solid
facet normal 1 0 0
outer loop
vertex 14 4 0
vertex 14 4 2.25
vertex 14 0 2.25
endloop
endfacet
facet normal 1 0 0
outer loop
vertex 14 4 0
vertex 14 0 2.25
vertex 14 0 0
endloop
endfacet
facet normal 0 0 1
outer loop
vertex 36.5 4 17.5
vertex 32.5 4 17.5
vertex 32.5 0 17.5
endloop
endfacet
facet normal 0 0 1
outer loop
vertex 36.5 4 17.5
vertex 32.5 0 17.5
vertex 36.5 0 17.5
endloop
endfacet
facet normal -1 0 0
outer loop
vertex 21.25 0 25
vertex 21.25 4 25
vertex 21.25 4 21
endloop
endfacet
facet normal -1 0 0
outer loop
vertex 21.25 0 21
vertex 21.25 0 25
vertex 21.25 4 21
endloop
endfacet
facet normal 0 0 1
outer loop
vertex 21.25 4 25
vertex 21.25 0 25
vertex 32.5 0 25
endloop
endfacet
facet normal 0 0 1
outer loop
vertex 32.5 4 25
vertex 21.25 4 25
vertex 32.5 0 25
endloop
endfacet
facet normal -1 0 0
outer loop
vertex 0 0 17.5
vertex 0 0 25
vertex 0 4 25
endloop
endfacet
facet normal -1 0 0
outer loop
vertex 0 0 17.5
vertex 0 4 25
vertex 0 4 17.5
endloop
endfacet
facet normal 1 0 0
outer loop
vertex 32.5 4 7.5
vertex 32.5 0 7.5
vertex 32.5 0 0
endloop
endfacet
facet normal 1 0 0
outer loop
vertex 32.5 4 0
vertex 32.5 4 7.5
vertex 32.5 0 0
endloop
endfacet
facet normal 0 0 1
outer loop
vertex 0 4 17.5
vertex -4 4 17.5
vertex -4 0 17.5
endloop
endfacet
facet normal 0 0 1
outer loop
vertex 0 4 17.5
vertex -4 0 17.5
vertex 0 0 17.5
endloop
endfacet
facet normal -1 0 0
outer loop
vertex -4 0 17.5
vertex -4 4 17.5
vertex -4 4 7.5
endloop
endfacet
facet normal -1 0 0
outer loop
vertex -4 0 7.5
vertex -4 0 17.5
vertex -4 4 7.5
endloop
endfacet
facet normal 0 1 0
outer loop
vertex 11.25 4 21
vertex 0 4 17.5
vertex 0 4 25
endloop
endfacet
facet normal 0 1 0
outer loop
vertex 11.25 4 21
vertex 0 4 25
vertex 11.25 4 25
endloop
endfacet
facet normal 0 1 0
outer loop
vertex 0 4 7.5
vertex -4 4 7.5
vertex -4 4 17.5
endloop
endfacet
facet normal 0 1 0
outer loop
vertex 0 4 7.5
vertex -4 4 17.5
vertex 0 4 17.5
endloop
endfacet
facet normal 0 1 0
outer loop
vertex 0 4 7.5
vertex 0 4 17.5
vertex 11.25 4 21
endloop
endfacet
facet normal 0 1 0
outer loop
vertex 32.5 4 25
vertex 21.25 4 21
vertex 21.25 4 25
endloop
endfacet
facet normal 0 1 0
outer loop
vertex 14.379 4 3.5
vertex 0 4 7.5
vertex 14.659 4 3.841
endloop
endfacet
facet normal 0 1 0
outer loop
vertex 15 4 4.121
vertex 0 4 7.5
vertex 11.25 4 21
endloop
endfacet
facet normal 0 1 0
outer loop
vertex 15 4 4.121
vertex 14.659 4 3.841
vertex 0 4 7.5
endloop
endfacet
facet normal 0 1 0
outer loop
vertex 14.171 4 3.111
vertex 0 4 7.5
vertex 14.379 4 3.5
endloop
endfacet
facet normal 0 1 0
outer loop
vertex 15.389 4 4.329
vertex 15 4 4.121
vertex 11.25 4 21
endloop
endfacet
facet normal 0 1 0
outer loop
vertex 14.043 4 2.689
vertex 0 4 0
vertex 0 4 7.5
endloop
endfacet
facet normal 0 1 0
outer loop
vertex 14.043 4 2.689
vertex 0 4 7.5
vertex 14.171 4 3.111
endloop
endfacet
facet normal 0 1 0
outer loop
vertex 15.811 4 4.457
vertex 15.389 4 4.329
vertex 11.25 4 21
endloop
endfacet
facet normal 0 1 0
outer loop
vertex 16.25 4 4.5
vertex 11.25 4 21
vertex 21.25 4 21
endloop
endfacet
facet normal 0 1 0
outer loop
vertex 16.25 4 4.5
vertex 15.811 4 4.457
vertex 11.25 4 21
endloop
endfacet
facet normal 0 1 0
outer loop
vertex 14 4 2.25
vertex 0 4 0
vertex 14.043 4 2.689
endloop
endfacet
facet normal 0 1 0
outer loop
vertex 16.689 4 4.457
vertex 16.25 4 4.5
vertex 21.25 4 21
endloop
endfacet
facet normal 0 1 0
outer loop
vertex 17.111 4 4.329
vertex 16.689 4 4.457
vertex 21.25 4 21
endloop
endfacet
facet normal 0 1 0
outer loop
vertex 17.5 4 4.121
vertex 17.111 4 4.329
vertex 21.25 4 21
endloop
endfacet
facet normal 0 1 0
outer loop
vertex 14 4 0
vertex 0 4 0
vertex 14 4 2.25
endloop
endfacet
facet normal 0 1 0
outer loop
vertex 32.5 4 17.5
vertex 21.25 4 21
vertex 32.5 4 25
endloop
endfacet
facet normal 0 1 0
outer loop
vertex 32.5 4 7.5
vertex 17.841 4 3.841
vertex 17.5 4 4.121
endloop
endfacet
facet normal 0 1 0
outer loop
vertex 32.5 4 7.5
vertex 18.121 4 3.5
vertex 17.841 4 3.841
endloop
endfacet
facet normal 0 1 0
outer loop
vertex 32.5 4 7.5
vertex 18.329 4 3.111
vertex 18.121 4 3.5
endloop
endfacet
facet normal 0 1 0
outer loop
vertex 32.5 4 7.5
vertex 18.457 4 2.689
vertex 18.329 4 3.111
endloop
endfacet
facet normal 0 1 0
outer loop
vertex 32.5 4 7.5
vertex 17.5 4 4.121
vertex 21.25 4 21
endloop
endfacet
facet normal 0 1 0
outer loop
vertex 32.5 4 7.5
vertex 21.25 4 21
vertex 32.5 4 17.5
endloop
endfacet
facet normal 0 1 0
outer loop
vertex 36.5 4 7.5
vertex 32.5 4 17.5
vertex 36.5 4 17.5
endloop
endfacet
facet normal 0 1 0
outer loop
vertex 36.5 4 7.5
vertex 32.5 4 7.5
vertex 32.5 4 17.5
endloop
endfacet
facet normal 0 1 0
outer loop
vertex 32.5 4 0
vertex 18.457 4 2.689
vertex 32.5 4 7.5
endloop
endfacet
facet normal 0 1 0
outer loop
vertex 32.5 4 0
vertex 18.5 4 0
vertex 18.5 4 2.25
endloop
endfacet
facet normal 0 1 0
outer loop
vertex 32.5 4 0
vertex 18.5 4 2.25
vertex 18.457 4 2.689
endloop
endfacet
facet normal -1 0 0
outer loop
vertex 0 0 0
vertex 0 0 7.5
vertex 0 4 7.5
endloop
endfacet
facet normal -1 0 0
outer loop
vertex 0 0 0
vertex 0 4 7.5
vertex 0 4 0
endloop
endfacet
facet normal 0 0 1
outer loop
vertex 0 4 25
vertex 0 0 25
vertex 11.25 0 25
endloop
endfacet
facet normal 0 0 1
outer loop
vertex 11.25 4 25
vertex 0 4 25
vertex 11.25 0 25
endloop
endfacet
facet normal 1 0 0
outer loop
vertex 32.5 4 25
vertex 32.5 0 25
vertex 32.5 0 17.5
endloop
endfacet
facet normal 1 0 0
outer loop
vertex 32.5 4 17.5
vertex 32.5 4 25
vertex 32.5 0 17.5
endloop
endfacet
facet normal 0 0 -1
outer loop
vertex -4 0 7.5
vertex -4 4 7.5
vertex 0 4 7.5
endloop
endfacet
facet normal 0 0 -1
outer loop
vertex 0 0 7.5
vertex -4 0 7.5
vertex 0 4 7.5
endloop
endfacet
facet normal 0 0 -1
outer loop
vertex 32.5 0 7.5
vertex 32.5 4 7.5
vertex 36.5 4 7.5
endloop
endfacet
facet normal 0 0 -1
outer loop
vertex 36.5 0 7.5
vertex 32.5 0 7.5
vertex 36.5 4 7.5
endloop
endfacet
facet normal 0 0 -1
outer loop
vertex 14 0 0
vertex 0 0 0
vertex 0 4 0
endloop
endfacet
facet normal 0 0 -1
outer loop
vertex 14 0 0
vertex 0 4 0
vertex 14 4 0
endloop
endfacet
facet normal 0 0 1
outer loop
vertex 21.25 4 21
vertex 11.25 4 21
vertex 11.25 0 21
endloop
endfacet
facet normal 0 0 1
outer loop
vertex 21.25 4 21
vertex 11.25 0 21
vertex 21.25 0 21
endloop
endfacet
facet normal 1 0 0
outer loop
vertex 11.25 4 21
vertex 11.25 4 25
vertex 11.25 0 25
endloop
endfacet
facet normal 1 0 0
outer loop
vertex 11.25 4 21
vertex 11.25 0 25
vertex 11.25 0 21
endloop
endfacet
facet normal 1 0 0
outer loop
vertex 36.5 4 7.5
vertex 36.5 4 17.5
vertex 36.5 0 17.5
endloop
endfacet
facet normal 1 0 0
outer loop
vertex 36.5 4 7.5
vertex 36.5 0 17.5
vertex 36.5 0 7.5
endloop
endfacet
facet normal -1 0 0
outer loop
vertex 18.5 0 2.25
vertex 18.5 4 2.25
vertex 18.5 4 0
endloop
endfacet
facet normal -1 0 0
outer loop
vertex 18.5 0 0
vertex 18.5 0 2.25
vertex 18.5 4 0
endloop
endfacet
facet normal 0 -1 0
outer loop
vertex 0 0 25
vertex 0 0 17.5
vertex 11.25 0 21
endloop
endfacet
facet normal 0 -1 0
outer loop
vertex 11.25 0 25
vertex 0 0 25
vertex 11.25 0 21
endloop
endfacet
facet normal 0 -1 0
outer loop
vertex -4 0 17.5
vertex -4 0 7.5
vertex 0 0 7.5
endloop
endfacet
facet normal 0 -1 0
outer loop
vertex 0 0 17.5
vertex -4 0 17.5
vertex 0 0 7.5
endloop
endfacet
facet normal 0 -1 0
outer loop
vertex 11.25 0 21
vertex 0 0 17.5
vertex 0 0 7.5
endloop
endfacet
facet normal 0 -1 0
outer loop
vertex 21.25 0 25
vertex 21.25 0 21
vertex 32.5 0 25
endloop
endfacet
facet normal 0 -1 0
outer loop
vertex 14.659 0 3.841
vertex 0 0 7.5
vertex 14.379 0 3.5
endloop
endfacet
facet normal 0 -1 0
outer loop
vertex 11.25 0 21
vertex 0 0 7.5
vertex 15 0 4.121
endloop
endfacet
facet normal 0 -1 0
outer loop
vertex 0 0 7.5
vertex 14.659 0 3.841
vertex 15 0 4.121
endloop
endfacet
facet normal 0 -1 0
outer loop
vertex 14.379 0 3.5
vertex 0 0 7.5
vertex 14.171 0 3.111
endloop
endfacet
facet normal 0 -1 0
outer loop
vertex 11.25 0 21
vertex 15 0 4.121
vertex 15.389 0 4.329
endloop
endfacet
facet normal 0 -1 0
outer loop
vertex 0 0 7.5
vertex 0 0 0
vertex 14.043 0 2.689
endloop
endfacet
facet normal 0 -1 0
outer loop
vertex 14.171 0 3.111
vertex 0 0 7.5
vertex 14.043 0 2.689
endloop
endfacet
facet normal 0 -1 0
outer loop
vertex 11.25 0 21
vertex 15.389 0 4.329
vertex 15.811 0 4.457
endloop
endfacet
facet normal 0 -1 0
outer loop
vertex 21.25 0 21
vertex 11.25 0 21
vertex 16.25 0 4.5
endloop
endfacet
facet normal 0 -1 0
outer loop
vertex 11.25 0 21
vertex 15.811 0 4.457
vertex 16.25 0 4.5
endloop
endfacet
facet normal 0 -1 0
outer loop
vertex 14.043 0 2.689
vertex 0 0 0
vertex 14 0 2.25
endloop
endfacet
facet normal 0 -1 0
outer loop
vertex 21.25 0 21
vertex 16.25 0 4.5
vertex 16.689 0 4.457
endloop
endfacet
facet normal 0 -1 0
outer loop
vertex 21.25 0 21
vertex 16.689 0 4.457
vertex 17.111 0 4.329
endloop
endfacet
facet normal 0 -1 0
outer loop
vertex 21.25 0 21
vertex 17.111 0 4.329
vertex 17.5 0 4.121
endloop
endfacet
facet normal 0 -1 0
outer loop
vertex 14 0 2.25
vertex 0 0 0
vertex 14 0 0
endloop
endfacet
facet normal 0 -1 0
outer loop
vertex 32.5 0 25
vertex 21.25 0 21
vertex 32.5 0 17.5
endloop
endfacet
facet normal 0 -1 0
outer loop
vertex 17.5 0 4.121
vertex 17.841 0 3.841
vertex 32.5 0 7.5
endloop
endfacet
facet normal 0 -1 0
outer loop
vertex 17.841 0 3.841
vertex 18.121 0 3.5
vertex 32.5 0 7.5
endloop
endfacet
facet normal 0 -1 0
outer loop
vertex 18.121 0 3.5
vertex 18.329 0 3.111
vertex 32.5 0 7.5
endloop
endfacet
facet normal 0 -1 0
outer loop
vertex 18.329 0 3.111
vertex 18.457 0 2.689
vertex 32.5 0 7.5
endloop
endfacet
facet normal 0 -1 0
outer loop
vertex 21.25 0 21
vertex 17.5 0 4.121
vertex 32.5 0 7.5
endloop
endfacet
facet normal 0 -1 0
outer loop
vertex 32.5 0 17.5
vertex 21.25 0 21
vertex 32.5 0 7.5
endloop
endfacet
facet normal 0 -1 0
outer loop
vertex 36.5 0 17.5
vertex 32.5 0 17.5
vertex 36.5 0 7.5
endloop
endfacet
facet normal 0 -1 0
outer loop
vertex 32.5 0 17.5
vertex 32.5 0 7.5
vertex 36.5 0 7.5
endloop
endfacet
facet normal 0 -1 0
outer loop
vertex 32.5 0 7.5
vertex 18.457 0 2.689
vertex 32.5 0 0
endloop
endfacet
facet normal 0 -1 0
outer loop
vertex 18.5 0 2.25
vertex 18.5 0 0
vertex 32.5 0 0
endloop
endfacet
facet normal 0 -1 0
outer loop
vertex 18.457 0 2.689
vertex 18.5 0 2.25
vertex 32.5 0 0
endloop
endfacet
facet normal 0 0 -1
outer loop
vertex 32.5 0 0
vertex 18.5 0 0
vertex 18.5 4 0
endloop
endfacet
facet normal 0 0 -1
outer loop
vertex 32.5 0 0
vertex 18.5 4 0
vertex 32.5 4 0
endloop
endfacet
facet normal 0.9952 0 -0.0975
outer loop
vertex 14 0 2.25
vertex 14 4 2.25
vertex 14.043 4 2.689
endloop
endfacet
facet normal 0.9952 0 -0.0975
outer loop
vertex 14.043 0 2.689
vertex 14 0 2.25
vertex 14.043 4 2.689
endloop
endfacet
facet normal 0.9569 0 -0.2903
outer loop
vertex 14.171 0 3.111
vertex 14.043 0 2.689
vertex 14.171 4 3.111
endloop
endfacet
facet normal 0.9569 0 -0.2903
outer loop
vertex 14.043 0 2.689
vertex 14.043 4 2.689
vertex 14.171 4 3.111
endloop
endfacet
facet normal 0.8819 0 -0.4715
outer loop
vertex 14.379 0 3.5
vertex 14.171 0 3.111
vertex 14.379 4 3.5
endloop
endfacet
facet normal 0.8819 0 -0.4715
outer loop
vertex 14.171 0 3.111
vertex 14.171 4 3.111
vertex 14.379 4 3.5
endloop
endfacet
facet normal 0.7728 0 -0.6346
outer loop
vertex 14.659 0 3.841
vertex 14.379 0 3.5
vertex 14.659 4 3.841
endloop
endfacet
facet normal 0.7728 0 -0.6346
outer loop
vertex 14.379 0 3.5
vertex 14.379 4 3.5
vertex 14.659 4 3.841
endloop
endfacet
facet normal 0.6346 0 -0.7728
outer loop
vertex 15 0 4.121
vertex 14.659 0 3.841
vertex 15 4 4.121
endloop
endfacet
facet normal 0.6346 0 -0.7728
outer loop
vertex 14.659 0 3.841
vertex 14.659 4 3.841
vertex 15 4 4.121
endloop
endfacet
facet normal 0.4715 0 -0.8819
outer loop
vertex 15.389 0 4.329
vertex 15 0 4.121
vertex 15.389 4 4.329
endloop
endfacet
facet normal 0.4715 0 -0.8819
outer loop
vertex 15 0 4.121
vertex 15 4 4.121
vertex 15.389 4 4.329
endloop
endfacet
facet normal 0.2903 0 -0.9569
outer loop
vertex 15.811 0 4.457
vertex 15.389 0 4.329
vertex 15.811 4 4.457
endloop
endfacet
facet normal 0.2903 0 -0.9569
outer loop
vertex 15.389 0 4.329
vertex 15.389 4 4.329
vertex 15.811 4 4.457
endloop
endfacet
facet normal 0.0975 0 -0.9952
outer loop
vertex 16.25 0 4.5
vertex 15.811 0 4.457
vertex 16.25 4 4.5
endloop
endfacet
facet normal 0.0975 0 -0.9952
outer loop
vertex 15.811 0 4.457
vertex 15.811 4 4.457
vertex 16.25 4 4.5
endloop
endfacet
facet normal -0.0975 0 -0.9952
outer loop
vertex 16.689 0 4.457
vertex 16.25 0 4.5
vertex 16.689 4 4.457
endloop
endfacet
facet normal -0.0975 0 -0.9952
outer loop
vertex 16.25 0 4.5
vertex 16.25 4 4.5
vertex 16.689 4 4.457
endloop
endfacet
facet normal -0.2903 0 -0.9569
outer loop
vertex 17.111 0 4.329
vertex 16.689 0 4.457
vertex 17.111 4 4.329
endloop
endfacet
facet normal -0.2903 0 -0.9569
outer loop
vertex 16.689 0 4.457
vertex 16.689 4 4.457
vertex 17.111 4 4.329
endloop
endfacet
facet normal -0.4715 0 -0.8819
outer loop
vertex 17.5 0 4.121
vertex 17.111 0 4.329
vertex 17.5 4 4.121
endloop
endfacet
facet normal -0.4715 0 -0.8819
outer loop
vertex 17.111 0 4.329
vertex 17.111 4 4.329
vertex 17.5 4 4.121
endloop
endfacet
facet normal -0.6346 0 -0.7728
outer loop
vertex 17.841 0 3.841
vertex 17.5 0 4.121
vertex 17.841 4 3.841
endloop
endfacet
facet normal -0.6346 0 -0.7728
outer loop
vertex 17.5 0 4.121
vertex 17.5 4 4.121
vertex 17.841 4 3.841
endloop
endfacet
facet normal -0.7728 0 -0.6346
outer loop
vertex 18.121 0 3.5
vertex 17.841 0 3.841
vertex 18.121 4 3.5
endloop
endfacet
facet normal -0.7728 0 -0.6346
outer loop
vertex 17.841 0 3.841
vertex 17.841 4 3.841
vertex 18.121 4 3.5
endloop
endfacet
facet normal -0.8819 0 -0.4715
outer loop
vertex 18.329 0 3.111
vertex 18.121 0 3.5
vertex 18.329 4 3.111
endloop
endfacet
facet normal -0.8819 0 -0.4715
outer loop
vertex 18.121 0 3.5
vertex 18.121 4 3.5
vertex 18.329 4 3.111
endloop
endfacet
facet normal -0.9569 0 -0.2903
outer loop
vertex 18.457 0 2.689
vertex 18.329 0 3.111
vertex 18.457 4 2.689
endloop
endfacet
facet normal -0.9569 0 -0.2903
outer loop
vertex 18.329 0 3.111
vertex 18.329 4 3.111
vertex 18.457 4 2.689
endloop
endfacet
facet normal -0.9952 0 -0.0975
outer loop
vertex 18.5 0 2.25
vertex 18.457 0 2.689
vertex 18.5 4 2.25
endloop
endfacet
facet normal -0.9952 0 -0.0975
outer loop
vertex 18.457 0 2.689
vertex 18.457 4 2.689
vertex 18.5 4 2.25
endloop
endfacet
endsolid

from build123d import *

# Parameters (mm, degrees)
SKETCH1_W           = 32.5
SKETCH1_H           = 25
BOSS_EXTRUDE1_DEPTH = 4
SKETCH2_R           = 2.25
SKETCH2_W           = 4.5
SKETCH2_H           = 2.25
CUT_EXTRUDE5_DEPTH  = 5
SKETCH3_W           = 4
SKETCH3_H           = 10
BOSS_EXTRUDE2_DEPTH = 4
SKETCH4_W           = 10
SKETCH4_H           = 4
CUT_EXTRUDE6_DEPTH  = 5


with BuildPart() as part:
    # Sketch1 → Boss-Extrude1 (new body)
    with BuildSketch(Plane(origin=(0, 0, 0), x_dir=(1, 0, 0), z_dir=(0, 1, 0))):
        with Locations((16.25, -12.5)):
            Rectangle(SKETCH1_W, SKETCH1_H)
    extrude(amount=BOSS_EXTRUDE1_DEPTH)

    # Sketch2 → Cut-Extrude5 (cut, through all)
    with BuildSketch(Plane(origin=(0, 4, 0), x_dir=(1, 0, 0), z_dir=(0, 1, 0))):
        with Locations((16.25, -2.25)):
            Circle(SKETCH2_R)
        with Locations((16.25, -1.125)):
            Rectangle(SKETCH2_W, SKETCH2_H)
    extrude(amount=-CUT_EXTRUDE5_DEPTH, mode=Mode.SUBTRACT)

    # Sketch3 → Boss-Extrude2 (add, through all)
    with BuildSketch(Plane(origin=(0, 4, 0), x_dir=(1, 0, 0), z_dir=(0, 1, 0))):
        with Locations((-2, -12.5)):
            Rectangle(SKETCH3_W, SKETCH3_H)
        with Locations((34.5, -12.5)):
            Rectangle(SKETCH3_W, SKETCH3_H)
    extrude(amount=-BOSS_EXTRUDE2_DEPTH)

    # Sketch4 → Cut-Extrude6 (cut, through all)
    with BuildSketch(Plane(origin=(0, 4, 0), x_dir=(1, 0, 0), z_dir=(0, 1, 0))):
        with Locations((16.25, -23)):
            Rectangle(SKETCH4_W, SKETCH4_H)
    extrude(amount=-CUT_EXTRUDE6_DEPTH, mode=Mode.SUBTRACT)


solid = part.part
